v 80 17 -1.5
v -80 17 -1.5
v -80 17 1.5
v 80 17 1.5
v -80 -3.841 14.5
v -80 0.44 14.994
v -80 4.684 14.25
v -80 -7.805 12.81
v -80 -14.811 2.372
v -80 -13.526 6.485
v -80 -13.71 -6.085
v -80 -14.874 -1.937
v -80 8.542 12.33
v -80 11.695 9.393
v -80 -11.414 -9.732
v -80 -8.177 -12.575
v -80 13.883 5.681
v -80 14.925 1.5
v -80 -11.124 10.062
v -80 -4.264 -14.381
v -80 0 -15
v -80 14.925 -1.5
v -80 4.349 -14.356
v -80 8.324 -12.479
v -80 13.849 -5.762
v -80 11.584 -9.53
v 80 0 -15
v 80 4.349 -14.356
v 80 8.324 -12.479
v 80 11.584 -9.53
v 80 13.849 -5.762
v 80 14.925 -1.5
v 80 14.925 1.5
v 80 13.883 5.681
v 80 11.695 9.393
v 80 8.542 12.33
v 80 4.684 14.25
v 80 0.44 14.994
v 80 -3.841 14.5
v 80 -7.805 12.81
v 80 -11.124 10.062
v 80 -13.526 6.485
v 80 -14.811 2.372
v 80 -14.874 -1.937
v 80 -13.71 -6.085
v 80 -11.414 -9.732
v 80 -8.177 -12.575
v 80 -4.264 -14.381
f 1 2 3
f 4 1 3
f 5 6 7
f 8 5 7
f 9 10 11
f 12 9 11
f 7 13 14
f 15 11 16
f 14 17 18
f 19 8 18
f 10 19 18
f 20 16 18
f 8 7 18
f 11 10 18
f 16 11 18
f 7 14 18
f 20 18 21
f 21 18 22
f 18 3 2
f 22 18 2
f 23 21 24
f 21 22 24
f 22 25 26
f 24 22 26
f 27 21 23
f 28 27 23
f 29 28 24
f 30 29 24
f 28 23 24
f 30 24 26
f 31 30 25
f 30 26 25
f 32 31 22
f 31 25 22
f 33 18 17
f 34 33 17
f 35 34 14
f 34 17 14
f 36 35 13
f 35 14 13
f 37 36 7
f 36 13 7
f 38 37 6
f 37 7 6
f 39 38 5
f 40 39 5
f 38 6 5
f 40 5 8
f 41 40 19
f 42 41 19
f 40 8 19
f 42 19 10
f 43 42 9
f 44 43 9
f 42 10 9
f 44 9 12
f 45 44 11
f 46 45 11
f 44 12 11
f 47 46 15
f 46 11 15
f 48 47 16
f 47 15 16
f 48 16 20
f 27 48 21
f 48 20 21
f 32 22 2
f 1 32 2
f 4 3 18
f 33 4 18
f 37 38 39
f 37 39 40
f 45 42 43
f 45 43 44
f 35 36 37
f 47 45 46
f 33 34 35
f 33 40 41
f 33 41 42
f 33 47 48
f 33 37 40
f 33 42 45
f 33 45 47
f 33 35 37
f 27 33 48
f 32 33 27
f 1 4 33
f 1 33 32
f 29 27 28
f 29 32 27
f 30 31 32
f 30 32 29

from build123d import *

# Parameters (mm, degrees)
EXTRUDE_START   = -80
EXTRUDE_1_DEPTH = 160


with BuildPart() as part:
    # 草图1 → 凸台-拉伸1 (new body)
    with BuildSketch(Plane(origin=(0, 0, 0), x_dir=(0, 0, -1), z_dir=(1, 0, 0)).offset(EXTRUDE_START)):
        with BuildLine():
            Line((-1.5, 14.924811557), (-1.5, 0))
            Line((-1.5, 0), (1.5, 0))
            Line((1.5, 0), (1.5, 14.924811557))
            ThreePointArc((1.5, 14.924811557), (0, 15), (-1.5, 14.924811557))
        make_face()
        with BuildLine():
            Line((1.5, 0), (-1.5, 0))
            Line((-1.5, 0), (-1.5, 14.924811557))
            ThreePointArc((-1.5, 14.924811557), (-10.062305899, -11.124297731), (15, 0))
            ThreePointArc((15, 0), (11.124297731, 10.062305899), (1.5, 14.924811557))
            Line((1.5, 14.924811557), (1.5, 0))
        make_face()
        with BuildLine():
            Line((-1.5, 17), (-1.5, 14.924811557))
            ThreePointArc((-1.5, 14.924811557), (0, 15), (1.5, 14.924811557))
            Line((1.5, 14.924811557), (1.5, 17))
            Line((1.5, 17), (-1.5, 17))
        make_face()
    extrude(amount=EXTRUDE_1_DEPTH)


solid = part.part
